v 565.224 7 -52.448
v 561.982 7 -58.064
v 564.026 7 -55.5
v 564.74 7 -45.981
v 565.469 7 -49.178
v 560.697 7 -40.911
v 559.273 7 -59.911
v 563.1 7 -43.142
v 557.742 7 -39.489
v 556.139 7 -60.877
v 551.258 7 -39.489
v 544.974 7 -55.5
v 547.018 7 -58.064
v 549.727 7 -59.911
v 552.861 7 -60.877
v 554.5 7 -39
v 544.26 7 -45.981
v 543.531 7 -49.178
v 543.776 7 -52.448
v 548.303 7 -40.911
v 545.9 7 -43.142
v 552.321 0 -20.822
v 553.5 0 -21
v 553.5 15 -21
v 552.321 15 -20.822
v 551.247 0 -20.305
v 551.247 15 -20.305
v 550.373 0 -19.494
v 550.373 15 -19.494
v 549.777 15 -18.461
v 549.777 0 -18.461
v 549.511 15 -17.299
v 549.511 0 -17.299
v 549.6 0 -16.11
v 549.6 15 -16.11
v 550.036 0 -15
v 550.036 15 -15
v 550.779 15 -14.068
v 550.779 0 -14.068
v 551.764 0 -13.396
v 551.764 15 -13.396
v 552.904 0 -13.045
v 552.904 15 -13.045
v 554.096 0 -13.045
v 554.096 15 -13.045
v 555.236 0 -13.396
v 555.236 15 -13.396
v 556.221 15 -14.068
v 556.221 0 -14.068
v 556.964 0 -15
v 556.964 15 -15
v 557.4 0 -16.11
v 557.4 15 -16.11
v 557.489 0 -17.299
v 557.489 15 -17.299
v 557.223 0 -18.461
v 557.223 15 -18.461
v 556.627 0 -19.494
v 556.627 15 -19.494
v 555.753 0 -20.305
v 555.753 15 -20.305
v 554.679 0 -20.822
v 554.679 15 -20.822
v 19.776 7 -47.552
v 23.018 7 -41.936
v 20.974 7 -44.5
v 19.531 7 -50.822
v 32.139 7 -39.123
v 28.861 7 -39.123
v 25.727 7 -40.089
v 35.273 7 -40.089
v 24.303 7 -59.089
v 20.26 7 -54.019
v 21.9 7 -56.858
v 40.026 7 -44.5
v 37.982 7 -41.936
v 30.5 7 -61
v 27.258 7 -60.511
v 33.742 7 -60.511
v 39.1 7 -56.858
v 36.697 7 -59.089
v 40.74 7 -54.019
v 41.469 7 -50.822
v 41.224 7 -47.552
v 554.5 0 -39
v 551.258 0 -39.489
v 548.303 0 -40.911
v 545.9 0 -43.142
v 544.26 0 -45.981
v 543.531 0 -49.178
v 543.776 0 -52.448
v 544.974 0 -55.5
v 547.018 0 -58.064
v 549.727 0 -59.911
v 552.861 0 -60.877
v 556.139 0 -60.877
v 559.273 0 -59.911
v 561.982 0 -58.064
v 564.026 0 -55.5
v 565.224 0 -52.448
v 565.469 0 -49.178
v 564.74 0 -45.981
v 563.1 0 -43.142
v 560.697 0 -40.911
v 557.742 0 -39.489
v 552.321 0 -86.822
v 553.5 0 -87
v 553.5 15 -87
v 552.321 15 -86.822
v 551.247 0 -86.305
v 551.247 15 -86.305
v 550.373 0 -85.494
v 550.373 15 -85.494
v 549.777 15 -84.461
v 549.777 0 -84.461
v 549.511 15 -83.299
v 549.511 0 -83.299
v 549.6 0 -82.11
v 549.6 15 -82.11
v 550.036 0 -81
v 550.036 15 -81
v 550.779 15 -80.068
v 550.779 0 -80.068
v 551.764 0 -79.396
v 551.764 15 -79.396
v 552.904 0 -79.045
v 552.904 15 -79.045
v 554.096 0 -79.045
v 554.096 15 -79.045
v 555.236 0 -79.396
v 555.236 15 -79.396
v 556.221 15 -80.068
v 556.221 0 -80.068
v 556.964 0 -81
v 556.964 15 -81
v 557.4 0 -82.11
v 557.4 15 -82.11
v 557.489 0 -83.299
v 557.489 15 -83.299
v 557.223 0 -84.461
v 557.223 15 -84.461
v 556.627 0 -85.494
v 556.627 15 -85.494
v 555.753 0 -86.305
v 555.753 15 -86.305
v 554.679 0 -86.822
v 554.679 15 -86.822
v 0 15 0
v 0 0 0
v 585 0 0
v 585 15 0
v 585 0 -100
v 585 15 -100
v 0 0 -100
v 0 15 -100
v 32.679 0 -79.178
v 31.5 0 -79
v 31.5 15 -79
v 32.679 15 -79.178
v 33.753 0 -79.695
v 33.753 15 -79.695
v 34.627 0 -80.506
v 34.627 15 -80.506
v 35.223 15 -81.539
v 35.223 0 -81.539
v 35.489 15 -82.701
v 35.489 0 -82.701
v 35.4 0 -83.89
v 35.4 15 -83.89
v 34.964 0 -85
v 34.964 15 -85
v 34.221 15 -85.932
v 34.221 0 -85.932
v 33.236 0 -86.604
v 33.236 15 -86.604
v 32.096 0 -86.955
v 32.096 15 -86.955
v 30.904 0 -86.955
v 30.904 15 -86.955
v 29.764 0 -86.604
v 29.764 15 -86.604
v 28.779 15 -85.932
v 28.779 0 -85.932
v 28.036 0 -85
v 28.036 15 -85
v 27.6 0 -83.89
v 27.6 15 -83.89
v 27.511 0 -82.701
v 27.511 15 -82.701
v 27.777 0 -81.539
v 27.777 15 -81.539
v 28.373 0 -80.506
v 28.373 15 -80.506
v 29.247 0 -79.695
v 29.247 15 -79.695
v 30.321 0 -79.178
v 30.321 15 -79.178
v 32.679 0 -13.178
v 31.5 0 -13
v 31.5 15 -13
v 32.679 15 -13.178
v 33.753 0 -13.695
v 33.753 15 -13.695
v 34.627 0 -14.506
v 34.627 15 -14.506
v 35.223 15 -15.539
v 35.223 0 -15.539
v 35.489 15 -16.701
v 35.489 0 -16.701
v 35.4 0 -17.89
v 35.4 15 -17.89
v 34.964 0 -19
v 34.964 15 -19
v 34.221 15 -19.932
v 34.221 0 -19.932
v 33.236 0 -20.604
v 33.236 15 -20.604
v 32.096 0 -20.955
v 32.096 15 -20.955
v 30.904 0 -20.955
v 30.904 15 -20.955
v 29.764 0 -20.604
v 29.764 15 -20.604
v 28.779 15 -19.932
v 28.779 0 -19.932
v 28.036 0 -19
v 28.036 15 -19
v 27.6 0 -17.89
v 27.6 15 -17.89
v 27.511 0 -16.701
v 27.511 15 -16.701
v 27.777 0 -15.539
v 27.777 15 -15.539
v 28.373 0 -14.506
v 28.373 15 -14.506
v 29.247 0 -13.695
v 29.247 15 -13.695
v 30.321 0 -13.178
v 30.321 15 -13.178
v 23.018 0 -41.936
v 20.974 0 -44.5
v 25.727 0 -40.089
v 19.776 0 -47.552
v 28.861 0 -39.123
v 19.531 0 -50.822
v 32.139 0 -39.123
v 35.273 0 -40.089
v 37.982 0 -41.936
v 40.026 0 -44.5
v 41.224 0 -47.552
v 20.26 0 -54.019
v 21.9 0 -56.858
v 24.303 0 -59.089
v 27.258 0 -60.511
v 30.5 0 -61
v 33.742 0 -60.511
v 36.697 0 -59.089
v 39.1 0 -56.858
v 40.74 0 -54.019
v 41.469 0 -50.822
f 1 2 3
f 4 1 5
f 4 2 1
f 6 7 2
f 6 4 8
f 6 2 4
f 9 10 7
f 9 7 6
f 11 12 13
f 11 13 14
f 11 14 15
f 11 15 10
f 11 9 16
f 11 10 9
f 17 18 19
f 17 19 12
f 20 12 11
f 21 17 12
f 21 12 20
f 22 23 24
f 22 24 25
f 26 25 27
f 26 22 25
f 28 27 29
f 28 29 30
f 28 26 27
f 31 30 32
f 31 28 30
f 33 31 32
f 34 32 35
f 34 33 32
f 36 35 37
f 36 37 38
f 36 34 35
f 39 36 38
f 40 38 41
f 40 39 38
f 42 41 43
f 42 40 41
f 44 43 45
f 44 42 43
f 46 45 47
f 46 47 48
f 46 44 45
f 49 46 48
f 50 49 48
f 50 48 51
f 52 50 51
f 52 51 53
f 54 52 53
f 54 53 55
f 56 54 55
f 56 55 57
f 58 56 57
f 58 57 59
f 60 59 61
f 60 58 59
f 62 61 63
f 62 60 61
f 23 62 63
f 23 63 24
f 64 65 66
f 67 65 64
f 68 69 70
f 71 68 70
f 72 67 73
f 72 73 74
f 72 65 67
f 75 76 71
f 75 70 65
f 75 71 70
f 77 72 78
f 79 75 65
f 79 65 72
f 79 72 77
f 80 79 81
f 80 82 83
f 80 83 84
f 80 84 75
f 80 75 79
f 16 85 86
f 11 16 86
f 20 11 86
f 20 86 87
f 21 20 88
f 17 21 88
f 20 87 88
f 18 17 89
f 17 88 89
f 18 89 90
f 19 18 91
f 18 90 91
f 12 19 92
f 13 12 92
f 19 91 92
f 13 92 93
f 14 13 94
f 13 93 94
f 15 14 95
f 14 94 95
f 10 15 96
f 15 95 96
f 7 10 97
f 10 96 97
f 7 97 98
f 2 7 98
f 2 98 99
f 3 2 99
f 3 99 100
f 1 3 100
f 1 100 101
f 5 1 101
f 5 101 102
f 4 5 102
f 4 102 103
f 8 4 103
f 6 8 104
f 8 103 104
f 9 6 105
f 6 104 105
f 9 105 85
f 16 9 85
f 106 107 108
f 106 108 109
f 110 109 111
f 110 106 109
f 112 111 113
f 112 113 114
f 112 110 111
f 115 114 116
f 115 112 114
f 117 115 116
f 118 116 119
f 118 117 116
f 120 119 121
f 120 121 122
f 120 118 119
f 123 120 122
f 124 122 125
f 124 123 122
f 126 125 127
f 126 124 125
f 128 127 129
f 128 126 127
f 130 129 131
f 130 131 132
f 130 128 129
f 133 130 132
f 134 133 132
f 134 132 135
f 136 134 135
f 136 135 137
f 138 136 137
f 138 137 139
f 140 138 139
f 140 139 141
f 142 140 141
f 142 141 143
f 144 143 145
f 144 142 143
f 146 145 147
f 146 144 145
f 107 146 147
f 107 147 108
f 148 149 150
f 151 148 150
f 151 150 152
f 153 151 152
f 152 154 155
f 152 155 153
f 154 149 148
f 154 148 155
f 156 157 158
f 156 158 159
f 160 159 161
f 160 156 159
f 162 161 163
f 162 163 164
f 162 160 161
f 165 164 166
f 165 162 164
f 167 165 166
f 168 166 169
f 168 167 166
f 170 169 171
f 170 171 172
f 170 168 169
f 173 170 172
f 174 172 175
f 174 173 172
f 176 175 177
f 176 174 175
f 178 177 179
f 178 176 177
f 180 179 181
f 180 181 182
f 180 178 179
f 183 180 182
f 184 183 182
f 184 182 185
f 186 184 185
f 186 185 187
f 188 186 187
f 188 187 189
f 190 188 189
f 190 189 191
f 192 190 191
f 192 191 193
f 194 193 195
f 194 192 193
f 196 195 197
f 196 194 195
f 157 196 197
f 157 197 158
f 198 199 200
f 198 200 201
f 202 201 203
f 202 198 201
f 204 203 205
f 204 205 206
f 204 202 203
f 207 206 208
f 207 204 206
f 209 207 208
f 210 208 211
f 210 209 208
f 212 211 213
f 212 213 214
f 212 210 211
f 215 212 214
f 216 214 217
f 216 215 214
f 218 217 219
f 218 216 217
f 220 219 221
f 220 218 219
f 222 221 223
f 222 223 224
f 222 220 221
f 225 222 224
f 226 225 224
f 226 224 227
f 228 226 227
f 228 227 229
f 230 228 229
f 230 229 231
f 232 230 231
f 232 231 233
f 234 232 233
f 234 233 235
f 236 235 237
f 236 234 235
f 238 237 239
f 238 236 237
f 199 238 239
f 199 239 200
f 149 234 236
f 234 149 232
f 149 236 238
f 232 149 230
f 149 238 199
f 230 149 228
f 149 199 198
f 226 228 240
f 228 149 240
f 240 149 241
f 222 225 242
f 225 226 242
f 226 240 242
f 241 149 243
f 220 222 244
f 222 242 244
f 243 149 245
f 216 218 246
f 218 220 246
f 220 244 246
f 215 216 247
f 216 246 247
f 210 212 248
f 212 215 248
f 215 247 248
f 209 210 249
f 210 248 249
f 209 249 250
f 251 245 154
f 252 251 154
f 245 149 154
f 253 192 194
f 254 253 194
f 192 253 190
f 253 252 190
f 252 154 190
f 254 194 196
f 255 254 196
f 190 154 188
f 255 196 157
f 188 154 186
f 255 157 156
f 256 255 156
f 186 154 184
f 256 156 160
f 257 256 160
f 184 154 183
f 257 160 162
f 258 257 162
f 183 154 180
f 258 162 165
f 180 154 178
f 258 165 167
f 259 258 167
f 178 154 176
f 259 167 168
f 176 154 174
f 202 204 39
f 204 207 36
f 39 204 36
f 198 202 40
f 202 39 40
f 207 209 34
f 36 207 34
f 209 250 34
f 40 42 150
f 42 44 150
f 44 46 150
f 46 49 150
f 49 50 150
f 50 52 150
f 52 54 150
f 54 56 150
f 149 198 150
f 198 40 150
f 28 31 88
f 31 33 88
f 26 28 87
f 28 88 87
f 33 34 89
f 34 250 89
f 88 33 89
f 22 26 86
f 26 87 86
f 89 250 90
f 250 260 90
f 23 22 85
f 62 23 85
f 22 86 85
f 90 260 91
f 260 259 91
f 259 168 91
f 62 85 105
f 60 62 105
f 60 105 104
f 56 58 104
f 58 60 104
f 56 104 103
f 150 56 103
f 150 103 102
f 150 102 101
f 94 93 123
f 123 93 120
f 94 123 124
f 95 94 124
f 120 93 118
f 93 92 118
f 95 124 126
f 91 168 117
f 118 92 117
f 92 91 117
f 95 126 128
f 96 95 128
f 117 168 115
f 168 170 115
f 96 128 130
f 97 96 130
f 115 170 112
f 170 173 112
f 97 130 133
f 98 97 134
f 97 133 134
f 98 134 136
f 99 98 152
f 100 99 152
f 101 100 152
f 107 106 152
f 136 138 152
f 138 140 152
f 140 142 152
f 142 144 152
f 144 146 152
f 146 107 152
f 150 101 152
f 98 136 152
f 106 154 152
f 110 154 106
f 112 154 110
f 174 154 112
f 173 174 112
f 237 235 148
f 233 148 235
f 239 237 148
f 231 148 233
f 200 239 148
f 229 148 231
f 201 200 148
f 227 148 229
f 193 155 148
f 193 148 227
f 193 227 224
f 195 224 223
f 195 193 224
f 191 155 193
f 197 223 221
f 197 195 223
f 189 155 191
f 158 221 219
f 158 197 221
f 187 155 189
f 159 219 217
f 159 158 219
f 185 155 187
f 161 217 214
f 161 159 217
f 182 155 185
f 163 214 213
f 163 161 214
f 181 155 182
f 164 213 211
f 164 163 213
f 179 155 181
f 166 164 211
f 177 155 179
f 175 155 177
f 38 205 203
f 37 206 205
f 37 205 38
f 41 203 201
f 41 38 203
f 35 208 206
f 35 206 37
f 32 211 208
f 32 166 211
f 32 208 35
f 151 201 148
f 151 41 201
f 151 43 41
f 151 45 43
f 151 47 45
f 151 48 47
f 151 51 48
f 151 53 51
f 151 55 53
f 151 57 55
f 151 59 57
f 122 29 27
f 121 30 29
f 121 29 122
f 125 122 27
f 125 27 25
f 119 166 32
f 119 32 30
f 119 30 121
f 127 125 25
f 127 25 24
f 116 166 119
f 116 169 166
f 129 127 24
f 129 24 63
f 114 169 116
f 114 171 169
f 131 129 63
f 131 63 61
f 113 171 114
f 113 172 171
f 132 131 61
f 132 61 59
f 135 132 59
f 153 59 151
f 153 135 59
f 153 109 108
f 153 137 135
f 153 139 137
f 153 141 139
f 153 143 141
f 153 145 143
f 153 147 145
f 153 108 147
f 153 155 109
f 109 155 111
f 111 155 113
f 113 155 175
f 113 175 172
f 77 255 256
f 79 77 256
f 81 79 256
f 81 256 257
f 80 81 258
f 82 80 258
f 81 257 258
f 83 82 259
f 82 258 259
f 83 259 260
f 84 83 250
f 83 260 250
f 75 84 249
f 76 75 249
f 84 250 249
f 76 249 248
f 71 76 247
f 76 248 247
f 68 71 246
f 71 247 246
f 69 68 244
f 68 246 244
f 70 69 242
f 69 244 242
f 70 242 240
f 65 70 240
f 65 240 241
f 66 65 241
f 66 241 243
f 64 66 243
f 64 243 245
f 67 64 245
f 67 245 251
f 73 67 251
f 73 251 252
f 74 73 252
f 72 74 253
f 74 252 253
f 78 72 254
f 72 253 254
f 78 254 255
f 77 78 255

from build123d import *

# Parameters (mm, degrees)
CROQUIS1_W              = 585
CROQUIS1_H              = 100
CROQUIS1_R              = 4
SALIENTE_EXTRUIR1_DEPTH = 15
CROQUIS2_R              = 11
CORTAR_EXTRUIR1_DEPTH   = 7


with BuildPart() as part:
    # Croquis1 → Saliente-Extruir1 (new body)
    with BuildSketch(Plane(origin=(0, 0, 0), x_dir=(1, 0, 0), z_dir=(0, 1, 0))):
        with Locations((292.5, 50)):
            Rectangle(CROQUIS1_W, CROQUIS1_H)
        with Locations(Location((31.5, 83, 0), (0, 0, 270))):
            Circle(CROQUIS1_R, mode=Mode.SUBTRACT)
        with Locations(Location((31.5, 17, 0), (0, 0, 270))):
            Circle(CROQUIS1_R, mode=Mode.SUBTRACT)
        with Locations(Location((553.5, 17, 0), (0, 0, 90))):
            Circle(CROQUIS1_R, mode=Mode.SUBTRACT)
        with Locations(Location((553.5, 83, 0), (0, 0, 90))):
            Circle(CROQUIS1_R, mode=Mode.SUBTRACT)
    extrude(amount=SALIENTE_EXTRUIR1_DEPTH)

    # Croquis2 → Cortar-Extruir1 (cut)
    with BuildSketch(Plane.XZ):
        with Locations(Location((30.5, -50, 0), (0, 0, 270))):
            Circle(CROQUIS2_R)
        with Locations(Location((554.5, -50, 0), (0, 0, 90))):
            Circle(CROQUIS2_R)
    extrude(amount=-CORTAR_EXTRUIR1_DEPTH, mode=Mode.SUBTRACT)


solid = part.part
